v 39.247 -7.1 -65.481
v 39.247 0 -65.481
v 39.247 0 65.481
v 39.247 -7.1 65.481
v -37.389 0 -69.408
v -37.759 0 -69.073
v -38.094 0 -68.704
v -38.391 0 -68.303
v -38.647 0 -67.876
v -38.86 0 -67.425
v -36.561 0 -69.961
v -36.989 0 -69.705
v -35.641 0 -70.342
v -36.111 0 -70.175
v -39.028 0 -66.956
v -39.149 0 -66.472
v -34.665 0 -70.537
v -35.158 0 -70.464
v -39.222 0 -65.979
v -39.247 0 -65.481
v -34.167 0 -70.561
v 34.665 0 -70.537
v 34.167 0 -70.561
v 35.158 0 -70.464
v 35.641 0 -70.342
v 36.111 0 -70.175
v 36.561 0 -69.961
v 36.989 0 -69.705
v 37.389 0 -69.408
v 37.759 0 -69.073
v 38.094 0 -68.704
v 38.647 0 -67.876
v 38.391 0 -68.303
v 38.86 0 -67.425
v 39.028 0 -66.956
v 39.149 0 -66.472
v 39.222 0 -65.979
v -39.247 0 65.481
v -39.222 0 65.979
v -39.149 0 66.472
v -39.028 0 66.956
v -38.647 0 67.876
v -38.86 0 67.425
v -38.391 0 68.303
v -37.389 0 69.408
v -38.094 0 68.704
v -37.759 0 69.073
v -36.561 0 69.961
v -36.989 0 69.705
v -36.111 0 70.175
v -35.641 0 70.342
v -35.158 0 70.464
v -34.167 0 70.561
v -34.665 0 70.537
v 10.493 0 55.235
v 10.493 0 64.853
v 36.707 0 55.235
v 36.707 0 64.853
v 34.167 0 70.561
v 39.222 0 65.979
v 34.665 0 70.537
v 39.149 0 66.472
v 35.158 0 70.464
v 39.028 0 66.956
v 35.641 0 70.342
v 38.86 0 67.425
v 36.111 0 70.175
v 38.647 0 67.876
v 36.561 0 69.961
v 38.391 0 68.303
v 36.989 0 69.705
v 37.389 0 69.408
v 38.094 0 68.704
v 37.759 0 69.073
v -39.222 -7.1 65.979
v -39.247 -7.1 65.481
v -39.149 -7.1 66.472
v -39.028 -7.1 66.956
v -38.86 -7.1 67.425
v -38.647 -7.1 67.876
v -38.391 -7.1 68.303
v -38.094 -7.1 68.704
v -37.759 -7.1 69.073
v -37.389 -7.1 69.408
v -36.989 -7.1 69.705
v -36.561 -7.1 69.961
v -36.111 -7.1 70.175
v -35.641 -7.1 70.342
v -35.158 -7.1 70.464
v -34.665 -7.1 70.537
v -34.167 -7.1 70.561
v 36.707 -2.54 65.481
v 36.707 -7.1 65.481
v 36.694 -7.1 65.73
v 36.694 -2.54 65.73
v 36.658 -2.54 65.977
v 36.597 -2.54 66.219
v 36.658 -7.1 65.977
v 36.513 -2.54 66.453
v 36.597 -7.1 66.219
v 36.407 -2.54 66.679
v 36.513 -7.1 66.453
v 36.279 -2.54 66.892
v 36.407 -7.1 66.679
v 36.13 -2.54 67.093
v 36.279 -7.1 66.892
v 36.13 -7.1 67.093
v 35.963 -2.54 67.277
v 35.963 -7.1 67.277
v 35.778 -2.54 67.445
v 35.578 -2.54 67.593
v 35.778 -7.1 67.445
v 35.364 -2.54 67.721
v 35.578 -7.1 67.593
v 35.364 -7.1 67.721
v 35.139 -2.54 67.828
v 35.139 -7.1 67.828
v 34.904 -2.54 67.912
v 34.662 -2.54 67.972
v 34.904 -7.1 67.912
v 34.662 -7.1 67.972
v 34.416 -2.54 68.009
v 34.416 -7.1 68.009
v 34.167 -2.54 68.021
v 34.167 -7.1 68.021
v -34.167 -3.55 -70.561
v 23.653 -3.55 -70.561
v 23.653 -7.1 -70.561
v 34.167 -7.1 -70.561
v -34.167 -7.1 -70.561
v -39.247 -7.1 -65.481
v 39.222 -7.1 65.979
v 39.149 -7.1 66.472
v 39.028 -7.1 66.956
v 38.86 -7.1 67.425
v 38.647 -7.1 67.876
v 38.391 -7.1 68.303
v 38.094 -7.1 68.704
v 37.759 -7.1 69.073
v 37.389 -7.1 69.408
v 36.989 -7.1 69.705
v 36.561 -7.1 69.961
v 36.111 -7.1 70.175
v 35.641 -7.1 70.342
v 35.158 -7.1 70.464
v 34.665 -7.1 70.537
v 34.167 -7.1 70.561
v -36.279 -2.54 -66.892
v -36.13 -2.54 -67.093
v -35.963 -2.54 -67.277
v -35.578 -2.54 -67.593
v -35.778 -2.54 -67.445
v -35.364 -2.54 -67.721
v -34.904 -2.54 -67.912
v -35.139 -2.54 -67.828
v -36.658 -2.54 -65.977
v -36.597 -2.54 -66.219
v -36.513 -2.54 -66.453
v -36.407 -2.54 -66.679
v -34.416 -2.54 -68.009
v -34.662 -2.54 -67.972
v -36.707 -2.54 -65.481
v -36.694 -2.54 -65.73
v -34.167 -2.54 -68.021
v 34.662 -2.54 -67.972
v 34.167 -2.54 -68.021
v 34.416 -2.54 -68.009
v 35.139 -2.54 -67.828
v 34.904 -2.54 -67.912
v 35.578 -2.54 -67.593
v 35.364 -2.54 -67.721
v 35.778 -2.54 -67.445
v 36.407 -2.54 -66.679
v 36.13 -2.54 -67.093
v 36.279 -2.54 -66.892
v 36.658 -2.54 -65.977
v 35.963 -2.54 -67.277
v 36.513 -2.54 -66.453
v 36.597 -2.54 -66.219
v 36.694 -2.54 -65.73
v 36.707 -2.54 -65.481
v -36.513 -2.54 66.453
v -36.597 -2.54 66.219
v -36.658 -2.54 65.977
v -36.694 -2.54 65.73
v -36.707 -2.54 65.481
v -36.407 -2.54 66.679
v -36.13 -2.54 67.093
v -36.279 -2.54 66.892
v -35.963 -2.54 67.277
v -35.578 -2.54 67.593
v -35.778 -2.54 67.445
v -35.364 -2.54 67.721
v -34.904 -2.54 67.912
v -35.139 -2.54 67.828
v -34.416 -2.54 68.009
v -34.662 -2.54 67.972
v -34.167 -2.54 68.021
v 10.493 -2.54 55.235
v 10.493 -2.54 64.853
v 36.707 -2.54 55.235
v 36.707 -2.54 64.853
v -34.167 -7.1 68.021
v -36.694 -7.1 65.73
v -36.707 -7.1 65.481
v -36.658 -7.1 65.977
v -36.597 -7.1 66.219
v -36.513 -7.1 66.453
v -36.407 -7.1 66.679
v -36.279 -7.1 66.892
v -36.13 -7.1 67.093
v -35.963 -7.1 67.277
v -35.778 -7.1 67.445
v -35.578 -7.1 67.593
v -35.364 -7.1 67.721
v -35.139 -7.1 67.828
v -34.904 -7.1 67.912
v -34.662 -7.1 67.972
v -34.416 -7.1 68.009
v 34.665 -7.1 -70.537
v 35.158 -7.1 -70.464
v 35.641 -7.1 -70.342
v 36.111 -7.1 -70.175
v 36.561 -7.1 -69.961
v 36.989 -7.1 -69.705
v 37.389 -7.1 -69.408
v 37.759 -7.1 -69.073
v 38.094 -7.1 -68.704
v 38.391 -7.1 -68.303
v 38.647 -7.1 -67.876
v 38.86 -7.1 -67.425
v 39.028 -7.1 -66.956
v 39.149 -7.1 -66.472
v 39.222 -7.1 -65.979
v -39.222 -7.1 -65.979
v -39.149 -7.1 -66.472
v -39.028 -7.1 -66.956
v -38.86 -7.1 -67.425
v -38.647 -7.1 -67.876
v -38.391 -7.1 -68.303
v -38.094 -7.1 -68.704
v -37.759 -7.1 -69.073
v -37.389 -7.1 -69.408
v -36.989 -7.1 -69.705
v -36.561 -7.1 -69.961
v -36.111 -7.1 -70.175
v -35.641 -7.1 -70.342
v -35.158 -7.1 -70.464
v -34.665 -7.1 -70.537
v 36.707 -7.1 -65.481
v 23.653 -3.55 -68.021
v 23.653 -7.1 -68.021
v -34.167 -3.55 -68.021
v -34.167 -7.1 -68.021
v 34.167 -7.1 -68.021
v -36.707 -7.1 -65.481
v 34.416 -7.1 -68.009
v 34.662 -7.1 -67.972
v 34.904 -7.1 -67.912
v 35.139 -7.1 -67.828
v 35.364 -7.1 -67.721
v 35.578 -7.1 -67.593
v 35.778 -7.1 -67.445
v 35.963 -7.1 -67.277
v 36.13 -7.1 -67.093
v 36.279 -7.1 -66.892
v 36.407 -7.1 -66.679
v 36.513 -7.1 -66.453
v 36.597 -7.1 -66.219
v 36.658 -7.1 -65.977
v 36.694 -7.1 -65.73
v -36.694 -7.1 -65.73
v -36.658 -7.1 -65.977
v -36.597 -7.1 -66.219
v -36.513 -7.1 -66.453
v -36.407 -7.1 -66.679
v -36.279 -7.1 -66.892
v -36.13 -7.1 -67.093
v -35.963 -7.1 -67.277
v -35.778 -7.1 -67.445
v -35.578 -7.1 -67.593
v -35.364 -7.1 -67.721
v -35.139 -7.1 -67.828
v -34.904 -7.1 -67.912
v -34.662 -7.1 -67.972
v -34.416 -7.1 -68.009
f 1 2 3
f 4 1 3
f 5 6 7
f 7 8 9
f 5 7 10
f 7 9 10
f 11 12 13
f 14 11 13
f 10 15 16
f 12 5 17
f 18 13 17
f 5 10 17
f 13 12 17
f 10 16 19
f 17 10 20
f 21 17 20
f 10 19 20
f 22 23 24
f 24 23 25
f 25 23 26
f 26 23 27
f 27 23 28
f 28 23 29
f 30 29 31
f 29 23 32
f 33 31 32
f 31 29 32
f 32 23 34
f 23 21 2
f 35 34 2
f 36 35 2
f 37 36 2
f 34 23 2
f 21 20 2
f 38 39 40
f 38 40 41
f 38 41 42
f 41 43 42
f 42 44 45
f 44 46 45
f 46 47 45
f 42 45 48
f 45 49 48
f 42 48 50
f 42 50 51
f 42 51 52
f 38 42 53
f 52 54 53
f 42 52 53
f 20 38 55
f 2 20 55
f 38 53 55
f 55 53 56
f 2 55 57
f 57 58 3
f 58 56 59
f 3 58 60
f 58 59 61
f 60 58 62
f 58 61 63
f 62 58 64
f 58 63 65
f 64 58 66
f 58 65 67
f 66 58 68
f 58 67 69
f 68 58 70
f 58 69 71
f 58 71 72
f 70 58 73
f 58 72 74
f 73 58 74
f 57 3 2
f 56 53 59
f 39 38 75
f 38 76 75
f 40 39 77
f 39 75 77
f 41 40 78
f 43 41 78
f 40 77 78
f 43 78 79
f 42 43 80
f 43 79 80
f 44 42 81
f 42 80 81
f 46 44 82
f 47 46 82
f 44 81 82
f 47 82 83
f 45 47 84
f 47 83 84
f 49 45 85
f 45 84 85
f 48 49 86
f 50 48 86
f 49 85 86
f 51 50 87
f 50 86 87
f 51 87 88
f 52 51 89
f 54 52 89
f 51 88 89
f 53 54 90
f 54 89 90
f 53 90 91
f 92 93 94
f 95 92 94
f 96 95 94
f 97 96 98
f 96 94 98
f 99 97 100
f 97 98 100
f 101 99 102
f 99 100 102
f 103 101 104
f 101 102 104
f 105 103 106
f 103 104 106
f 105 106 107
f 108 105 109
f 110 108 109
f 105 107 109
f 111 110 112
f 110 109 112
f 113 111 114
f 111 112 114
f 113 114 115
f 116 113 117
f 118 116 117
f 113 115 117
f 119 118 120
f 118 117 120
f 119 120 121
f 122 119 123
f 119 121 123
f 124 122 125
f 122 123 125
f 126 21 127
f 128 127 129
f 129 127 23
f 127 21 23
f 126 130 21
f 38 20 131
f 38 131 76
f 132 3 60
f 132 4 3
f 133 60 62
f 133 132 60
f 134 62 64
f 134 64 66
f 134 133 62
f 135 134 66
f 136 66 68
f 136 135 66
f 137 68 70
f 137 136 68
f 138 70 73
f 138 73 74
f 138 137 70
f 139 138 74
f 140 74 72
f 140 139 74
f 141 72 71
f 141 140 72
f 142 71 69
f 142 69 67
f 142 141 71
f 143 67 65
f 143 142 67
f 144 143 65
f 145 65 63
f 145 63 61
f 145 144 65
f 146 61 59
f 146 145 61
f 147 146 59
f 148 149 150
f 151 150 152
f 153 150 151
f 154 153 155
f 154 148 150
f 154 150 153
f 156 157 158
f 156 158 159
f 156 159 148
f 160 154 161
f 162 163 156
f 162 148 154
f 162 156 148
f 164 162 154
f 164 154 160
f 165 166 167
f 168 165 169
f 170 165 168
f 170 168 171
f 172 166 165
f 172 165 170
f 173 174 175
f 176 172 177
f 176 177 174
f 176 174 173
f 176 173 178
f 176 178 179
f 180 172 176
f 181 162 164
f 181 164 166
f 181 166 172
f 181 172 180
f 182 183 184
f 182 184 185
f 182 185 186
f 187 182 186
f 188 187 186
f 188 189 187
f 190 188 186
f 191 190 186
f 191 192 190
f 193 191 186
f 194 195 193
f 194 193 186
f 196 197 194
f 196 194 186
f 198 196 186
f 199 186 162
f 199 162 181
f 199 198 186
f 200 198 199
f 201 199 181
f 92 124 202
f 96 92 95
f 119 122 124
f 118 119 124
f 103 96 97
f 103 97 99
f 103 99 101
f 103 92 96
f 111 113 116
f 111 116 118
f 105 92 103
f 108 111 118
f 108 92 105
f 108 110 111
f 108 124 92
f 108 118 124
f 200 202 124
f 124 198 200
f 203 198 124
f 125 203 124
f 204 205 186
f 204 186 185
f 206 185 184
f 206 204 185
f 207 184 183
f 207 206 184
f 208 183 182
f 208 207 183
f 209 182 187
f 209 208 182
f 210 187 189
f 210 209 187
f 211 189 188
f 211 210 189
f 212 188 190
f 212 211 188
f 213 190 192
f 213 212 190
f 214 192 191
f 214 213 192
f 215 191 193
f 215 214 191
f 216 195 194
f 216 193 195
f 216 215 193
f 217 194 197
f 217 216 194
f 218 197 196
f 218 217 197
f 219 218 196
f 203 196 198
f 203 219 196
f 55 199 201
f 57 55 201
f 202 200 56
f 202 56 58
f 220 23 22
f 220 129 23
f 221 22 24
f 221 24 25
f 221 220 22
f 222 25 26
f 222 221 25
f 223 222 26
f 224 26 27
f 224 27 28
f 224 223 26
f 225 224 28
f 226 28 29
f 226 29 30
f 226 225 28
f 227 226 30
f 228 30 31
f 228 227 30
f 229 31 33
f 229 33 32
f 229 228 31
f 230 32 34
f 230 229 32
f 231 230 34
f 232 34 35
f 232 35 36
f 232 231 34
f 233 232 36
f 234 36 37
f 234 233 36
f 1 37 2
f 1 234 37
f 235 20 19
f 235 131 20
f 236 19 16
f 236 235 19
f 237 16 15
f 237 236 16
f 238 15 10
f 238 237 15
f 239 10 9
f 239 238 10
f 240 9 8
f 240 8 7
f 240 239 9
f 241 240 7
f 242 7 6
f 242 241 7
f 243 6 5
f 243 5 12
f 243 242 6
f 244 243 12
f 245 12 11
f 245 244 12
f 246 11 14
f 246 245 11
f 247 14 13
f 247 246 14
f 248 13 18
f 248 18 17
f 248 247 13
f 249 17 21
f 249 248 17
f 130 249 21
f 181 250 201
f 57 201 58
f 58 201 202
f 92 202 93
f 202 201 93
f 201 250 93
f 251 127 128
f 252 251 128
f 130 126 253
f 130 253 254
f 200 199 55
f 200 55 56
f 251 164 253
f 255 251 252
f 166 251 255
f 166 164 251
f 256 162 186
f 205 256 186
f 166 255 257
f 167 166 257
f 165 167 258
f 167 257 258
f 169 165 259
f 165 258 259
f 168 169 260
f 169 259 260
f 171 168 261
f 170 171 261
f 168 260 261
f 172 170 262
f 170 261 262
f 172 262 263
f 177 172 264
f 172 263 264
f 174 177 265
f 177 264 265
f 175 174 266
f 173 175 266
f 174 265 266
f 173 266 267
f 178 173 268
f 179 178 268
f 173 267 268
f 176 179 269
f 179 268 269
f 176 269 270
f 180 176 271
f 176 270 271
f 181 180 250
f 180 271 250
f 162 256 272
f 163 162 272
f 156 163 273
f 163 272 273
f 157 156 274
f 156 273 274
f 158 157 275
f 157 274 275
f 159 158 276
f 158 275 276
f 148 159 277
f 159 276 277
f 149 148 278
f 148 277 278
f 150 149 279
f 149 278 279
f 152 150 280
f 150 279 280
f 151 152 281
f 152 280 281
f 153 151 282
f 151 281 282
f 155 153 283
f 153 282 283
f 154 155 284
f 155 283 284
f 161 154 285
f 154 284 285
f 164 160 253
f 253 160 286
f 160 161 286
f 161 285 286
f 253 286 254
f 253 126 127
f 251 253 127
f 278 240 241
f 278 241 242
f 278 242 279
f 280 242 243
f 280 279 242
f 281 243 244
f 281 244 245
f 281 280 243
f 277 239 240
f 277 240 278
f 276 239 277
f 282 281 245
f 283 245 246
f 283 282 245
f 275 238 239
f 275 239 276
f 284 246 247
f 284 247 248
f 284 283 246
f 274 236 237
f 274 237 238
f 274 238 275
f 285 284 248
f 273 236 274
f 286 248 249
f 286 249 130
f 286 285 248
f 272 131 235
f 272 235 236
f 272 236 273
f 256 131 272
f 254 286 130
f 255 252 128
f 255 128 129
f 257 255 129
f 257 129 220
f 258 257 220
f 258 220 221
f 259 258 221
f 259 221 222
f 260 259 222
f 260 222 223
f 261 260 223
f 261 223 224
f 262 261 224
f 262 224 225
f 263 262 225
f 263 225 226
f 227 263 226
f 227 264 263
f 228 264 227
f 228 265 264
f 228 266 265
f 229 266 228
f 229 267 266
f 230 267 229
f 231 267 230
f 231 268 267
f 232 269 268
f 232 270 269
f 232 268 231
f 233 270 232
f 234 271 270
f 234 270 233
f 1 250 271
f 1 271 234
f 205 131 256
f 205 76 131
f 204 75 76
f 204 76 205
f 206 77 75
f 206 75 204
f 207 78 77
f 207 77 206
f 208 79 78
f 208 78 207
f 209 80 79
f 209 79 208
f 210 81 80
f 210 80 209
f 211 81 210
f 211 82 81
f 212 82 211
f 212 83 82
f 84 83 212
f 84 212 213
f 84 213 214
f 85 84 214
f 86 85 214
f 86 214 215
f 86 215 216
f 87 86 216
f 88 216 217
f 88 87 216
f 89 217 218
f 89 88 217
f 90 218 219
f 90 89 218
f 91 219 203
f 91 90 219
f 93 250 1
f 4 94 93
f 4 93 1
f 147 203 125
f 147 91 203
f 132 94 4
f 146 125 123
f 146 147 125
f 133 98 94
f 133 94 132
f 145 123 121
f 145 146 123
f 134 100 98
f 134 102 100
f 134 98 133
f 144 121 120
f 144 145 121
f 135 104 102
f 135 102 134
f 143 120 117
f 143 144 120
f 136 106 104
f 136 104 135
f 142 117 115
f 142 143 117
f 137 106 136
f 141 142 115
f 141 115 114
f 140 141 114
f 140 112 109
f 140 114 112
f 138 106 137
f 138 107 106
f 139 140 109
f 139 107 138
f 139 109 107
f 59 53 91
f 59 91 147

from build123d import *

# Parameters (mm, degrees)
F0_W     = 78.493316
F0_H     = 141.122394
F1_DEPTH = 7.1
F2_R     = 5.08
F3_T     = -2.54
F4_W     = 26.213542
F4_H     = 9.618692
F5_DEPTH = 12.7
F6_W     = 53.554615
F6_H     = 3.55
F6_W_2   = 4.265513
F7_DEPTH = 12.7


with BuildPart() as f1:
    # F0 (on Front) → F1 (new body)
    with BuildSketch(Plane.XZ):
        Rectangle(F0_W, F0_H)
    extrude(amount=F1_DEPTH)

    # F2
    f2_edges = [f1.edges().sort_by_distance(p)[0] for p in [
        (-39.246658, -3.55, 70.561197),
        (-39.246658, -3.55, -70.561197),
        (39.246658, -3.55, -70.561197),
        (39.246658, -3.55, 70.561197),
    ]]
    fillet(f2_edges, radius=F2_R)

    # F3
    f3_openings = [f1.faces().sort_by_distance(p)[0] for p in [
        (0, -7.1, 0),
    ]]
    offset(amount=F3_T, openings=f3_openings)

    # F4 (on face) → F5 (cut, symmetric)
    with BuildSketch(Plane.XZ.offset(2.54)):
        with Locations((23.599887, 60.043935)):
            Rectangle(F4_W, F4_H)
    extrude(amount=F5_DEPTH, both=True, mode=Mode.SUBTRACT)

    # F6 (on face) → F7 (cut, symmetric)
    with BuildSketch(Plane(origin=(0, 0, -70.561197), x_dir=(1, 0, 0), z_dir=(0, 0, -1))):
        with Locations((-7.38935, 5.325)):
            Rectangle(F6_W, F6_H)
        with Locations((21.520713, 5.325)):
            Rectangle(F6_W_2, F6_H)
    extrude(amount=F7_DEPTH, both=True, mode=Mode.SUBTRACT)


solid = f1.part
